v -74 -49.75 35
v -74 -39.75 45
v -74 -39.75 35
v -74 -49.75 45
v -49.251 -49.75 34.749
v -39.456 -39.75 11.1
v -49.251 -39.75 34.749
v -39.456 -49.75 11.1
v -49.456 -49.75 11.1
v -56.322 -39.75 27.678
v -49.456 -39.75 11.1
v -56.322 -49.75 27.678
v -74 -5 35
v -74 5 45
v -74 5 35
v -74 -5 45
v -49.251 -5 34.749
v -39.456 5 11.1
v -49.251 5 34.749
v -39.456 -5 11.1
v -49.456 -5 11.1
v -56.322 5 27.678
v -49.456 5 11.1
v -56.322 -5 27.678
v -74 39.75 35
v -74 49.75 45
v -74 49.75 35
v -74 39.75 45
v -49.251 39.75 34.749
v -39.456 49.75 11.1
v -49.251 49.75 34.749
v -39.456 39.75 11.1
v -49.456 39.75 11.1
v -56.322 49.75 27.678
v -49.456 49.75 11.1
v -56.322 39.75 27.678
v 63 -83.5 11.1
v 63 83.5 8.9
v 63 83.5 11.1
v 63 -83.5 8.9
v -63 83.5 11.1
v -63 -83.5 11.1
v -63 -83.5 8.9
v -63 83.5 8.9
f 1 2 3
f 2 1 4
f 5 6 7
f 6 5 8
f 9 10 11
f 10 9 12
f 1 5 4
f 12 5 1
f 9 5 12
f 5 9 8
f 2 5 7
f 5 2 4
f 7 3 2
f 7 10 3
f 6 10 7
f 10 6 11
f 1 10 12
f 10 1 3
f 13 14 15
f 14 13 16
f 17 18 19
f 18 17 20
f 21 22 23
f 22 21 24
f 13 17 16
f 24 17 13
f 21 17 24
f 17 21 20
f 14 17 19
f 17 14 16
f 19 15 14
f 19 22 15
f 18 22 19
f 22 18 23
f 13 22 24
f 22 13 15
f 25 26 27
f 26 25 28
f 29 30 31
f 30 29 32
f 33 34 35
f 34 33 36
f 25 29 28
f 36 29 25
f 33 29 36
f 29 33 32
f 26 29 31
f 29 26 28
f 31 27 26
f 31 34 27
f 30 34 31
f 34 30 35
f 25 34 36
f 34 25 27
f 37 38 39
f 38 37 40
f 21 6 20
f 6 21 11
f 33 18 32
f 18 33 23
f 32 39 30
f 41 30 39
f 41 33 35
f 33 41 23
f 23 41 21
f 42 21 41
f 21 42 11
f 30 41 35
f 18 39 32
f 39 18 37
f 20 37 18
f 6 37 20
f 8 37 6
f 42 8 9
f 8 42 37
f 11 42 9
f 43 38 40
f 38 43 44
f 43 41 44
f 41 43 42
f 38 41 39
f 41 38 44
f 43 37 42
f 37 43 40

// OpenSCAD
// file: chamfer.scad
module chamfered_cube(size, chamfer, center = false) {
    center_offset = center ? [
        -size[0]/2,
        -size[1]/2,
        -size[2]/2
    ] : [0,0,0];
    
    translate(center_offset)
    
    difference() {
        cube(size);
        
        chamfer_cross(size, chamfer);
        
        translate([0,size[1],size[2]])
        chamfer_cross(size, chamfer);
        
        translate([size[0],0,size[2]])
        chamfer_cross(size, chamfer);
        
        translate([size[0],size[1], 0])
        chamfer_cross(size, chamfer);
    }
}

module chamfer_cross(size, chamfer){
    for(z=[0:3]) for(y=[0:3])
            rotate([0,90*y,90*z])
            translate([max(size)/2,0,0])
            rotate([45,0,0])
            cube([max(size),chamfer,chamfer], true);
}

chamfered_cube([10,20,30], 2, true);
// main file
use <chamfer.scad>;

glass_width = 138;
glass_height = 179;
glass_depth = 2.2;

nest_gap = 10;

frame_overlap = 5;
frame_offset = 5;

cover_offset = 1;

light_cover();
module light_cover() {
    translate([0,0,10]){
    cube([
        glass_width - frame_overlap*2 - cover_offset*2,
        glass_height - frame_overlap*2 - cover_offset*2,
        glass_depth], true);
    
    for(i=[-1:1]){
        translate([-glass_width/2-frame_offset,i*glass_height/4,0])
        rotate([90])
        rotate_extrude(angle = 90, $fn=10)
        translate([30,0,0])
        square(10, true);
    }
    }
}

module glass() {
    cube([glass_width, glass_height, glass_depth], true);
}



module glass_plates(){
    translate([0,0,(nest_gap+glass_depth)/2])
    glass();

    translate([0,0,-(nest_gap+glass_depth)/2])
    glass();
}

module frame(){
    difference(){
        chamfered_cube([
            glass_width + frame_offset*2,
            glass_height + frame_offset*2,
            glass_depth + frame_offset*2 + glass_depth*2 + nest_gap
        ], 1, true);
        
        cube([
            glass_width - frame_overlap*2,
            glass_height - frame_overlap*2,
            glass_depth + frame_offset*3 + glass_depth*2 + nest_gap
        ], true);
        
        
    }
}

module air_gap(){
      translate([glass_width*0.4,0,nest_gap/4])
      cube([glass_width/8 , 200, 0.3], true);  
    
    translate([glass_width*0.4,0,-nest_gap/4])
      cube([glass_width/8 , 200, 0.3], true);  
    
    translate([glass_width/16 + glass_width*0.4,0,0])
      cube([0.1 , 200, nest_gap/2+0.3], true);
    
    translate([-glass_width/16 + glass_width*0.4,0,nest_gap*1.25])
      cube([0.1 , 200, nest_gap*2+0.3], true);
    
    translate([-glass_width/16 + glass_width*0.4,0,-nest_gap*1.25])
      cube([0.1 , 200, nest_gap*2+0.3], true);   
}

module tube(){
    translate([glass_width/4,glass_height/2,0])
    rotate([90,0,0])
        cylinder(
            frame_overlap+frame_offset,
            6/2,
            5.2/2,
            center=true,
            $fn=40
    );
}
/*
difference(){
    frame();
    air_gap();
   glass_plates();
    #tube();
}
*/
